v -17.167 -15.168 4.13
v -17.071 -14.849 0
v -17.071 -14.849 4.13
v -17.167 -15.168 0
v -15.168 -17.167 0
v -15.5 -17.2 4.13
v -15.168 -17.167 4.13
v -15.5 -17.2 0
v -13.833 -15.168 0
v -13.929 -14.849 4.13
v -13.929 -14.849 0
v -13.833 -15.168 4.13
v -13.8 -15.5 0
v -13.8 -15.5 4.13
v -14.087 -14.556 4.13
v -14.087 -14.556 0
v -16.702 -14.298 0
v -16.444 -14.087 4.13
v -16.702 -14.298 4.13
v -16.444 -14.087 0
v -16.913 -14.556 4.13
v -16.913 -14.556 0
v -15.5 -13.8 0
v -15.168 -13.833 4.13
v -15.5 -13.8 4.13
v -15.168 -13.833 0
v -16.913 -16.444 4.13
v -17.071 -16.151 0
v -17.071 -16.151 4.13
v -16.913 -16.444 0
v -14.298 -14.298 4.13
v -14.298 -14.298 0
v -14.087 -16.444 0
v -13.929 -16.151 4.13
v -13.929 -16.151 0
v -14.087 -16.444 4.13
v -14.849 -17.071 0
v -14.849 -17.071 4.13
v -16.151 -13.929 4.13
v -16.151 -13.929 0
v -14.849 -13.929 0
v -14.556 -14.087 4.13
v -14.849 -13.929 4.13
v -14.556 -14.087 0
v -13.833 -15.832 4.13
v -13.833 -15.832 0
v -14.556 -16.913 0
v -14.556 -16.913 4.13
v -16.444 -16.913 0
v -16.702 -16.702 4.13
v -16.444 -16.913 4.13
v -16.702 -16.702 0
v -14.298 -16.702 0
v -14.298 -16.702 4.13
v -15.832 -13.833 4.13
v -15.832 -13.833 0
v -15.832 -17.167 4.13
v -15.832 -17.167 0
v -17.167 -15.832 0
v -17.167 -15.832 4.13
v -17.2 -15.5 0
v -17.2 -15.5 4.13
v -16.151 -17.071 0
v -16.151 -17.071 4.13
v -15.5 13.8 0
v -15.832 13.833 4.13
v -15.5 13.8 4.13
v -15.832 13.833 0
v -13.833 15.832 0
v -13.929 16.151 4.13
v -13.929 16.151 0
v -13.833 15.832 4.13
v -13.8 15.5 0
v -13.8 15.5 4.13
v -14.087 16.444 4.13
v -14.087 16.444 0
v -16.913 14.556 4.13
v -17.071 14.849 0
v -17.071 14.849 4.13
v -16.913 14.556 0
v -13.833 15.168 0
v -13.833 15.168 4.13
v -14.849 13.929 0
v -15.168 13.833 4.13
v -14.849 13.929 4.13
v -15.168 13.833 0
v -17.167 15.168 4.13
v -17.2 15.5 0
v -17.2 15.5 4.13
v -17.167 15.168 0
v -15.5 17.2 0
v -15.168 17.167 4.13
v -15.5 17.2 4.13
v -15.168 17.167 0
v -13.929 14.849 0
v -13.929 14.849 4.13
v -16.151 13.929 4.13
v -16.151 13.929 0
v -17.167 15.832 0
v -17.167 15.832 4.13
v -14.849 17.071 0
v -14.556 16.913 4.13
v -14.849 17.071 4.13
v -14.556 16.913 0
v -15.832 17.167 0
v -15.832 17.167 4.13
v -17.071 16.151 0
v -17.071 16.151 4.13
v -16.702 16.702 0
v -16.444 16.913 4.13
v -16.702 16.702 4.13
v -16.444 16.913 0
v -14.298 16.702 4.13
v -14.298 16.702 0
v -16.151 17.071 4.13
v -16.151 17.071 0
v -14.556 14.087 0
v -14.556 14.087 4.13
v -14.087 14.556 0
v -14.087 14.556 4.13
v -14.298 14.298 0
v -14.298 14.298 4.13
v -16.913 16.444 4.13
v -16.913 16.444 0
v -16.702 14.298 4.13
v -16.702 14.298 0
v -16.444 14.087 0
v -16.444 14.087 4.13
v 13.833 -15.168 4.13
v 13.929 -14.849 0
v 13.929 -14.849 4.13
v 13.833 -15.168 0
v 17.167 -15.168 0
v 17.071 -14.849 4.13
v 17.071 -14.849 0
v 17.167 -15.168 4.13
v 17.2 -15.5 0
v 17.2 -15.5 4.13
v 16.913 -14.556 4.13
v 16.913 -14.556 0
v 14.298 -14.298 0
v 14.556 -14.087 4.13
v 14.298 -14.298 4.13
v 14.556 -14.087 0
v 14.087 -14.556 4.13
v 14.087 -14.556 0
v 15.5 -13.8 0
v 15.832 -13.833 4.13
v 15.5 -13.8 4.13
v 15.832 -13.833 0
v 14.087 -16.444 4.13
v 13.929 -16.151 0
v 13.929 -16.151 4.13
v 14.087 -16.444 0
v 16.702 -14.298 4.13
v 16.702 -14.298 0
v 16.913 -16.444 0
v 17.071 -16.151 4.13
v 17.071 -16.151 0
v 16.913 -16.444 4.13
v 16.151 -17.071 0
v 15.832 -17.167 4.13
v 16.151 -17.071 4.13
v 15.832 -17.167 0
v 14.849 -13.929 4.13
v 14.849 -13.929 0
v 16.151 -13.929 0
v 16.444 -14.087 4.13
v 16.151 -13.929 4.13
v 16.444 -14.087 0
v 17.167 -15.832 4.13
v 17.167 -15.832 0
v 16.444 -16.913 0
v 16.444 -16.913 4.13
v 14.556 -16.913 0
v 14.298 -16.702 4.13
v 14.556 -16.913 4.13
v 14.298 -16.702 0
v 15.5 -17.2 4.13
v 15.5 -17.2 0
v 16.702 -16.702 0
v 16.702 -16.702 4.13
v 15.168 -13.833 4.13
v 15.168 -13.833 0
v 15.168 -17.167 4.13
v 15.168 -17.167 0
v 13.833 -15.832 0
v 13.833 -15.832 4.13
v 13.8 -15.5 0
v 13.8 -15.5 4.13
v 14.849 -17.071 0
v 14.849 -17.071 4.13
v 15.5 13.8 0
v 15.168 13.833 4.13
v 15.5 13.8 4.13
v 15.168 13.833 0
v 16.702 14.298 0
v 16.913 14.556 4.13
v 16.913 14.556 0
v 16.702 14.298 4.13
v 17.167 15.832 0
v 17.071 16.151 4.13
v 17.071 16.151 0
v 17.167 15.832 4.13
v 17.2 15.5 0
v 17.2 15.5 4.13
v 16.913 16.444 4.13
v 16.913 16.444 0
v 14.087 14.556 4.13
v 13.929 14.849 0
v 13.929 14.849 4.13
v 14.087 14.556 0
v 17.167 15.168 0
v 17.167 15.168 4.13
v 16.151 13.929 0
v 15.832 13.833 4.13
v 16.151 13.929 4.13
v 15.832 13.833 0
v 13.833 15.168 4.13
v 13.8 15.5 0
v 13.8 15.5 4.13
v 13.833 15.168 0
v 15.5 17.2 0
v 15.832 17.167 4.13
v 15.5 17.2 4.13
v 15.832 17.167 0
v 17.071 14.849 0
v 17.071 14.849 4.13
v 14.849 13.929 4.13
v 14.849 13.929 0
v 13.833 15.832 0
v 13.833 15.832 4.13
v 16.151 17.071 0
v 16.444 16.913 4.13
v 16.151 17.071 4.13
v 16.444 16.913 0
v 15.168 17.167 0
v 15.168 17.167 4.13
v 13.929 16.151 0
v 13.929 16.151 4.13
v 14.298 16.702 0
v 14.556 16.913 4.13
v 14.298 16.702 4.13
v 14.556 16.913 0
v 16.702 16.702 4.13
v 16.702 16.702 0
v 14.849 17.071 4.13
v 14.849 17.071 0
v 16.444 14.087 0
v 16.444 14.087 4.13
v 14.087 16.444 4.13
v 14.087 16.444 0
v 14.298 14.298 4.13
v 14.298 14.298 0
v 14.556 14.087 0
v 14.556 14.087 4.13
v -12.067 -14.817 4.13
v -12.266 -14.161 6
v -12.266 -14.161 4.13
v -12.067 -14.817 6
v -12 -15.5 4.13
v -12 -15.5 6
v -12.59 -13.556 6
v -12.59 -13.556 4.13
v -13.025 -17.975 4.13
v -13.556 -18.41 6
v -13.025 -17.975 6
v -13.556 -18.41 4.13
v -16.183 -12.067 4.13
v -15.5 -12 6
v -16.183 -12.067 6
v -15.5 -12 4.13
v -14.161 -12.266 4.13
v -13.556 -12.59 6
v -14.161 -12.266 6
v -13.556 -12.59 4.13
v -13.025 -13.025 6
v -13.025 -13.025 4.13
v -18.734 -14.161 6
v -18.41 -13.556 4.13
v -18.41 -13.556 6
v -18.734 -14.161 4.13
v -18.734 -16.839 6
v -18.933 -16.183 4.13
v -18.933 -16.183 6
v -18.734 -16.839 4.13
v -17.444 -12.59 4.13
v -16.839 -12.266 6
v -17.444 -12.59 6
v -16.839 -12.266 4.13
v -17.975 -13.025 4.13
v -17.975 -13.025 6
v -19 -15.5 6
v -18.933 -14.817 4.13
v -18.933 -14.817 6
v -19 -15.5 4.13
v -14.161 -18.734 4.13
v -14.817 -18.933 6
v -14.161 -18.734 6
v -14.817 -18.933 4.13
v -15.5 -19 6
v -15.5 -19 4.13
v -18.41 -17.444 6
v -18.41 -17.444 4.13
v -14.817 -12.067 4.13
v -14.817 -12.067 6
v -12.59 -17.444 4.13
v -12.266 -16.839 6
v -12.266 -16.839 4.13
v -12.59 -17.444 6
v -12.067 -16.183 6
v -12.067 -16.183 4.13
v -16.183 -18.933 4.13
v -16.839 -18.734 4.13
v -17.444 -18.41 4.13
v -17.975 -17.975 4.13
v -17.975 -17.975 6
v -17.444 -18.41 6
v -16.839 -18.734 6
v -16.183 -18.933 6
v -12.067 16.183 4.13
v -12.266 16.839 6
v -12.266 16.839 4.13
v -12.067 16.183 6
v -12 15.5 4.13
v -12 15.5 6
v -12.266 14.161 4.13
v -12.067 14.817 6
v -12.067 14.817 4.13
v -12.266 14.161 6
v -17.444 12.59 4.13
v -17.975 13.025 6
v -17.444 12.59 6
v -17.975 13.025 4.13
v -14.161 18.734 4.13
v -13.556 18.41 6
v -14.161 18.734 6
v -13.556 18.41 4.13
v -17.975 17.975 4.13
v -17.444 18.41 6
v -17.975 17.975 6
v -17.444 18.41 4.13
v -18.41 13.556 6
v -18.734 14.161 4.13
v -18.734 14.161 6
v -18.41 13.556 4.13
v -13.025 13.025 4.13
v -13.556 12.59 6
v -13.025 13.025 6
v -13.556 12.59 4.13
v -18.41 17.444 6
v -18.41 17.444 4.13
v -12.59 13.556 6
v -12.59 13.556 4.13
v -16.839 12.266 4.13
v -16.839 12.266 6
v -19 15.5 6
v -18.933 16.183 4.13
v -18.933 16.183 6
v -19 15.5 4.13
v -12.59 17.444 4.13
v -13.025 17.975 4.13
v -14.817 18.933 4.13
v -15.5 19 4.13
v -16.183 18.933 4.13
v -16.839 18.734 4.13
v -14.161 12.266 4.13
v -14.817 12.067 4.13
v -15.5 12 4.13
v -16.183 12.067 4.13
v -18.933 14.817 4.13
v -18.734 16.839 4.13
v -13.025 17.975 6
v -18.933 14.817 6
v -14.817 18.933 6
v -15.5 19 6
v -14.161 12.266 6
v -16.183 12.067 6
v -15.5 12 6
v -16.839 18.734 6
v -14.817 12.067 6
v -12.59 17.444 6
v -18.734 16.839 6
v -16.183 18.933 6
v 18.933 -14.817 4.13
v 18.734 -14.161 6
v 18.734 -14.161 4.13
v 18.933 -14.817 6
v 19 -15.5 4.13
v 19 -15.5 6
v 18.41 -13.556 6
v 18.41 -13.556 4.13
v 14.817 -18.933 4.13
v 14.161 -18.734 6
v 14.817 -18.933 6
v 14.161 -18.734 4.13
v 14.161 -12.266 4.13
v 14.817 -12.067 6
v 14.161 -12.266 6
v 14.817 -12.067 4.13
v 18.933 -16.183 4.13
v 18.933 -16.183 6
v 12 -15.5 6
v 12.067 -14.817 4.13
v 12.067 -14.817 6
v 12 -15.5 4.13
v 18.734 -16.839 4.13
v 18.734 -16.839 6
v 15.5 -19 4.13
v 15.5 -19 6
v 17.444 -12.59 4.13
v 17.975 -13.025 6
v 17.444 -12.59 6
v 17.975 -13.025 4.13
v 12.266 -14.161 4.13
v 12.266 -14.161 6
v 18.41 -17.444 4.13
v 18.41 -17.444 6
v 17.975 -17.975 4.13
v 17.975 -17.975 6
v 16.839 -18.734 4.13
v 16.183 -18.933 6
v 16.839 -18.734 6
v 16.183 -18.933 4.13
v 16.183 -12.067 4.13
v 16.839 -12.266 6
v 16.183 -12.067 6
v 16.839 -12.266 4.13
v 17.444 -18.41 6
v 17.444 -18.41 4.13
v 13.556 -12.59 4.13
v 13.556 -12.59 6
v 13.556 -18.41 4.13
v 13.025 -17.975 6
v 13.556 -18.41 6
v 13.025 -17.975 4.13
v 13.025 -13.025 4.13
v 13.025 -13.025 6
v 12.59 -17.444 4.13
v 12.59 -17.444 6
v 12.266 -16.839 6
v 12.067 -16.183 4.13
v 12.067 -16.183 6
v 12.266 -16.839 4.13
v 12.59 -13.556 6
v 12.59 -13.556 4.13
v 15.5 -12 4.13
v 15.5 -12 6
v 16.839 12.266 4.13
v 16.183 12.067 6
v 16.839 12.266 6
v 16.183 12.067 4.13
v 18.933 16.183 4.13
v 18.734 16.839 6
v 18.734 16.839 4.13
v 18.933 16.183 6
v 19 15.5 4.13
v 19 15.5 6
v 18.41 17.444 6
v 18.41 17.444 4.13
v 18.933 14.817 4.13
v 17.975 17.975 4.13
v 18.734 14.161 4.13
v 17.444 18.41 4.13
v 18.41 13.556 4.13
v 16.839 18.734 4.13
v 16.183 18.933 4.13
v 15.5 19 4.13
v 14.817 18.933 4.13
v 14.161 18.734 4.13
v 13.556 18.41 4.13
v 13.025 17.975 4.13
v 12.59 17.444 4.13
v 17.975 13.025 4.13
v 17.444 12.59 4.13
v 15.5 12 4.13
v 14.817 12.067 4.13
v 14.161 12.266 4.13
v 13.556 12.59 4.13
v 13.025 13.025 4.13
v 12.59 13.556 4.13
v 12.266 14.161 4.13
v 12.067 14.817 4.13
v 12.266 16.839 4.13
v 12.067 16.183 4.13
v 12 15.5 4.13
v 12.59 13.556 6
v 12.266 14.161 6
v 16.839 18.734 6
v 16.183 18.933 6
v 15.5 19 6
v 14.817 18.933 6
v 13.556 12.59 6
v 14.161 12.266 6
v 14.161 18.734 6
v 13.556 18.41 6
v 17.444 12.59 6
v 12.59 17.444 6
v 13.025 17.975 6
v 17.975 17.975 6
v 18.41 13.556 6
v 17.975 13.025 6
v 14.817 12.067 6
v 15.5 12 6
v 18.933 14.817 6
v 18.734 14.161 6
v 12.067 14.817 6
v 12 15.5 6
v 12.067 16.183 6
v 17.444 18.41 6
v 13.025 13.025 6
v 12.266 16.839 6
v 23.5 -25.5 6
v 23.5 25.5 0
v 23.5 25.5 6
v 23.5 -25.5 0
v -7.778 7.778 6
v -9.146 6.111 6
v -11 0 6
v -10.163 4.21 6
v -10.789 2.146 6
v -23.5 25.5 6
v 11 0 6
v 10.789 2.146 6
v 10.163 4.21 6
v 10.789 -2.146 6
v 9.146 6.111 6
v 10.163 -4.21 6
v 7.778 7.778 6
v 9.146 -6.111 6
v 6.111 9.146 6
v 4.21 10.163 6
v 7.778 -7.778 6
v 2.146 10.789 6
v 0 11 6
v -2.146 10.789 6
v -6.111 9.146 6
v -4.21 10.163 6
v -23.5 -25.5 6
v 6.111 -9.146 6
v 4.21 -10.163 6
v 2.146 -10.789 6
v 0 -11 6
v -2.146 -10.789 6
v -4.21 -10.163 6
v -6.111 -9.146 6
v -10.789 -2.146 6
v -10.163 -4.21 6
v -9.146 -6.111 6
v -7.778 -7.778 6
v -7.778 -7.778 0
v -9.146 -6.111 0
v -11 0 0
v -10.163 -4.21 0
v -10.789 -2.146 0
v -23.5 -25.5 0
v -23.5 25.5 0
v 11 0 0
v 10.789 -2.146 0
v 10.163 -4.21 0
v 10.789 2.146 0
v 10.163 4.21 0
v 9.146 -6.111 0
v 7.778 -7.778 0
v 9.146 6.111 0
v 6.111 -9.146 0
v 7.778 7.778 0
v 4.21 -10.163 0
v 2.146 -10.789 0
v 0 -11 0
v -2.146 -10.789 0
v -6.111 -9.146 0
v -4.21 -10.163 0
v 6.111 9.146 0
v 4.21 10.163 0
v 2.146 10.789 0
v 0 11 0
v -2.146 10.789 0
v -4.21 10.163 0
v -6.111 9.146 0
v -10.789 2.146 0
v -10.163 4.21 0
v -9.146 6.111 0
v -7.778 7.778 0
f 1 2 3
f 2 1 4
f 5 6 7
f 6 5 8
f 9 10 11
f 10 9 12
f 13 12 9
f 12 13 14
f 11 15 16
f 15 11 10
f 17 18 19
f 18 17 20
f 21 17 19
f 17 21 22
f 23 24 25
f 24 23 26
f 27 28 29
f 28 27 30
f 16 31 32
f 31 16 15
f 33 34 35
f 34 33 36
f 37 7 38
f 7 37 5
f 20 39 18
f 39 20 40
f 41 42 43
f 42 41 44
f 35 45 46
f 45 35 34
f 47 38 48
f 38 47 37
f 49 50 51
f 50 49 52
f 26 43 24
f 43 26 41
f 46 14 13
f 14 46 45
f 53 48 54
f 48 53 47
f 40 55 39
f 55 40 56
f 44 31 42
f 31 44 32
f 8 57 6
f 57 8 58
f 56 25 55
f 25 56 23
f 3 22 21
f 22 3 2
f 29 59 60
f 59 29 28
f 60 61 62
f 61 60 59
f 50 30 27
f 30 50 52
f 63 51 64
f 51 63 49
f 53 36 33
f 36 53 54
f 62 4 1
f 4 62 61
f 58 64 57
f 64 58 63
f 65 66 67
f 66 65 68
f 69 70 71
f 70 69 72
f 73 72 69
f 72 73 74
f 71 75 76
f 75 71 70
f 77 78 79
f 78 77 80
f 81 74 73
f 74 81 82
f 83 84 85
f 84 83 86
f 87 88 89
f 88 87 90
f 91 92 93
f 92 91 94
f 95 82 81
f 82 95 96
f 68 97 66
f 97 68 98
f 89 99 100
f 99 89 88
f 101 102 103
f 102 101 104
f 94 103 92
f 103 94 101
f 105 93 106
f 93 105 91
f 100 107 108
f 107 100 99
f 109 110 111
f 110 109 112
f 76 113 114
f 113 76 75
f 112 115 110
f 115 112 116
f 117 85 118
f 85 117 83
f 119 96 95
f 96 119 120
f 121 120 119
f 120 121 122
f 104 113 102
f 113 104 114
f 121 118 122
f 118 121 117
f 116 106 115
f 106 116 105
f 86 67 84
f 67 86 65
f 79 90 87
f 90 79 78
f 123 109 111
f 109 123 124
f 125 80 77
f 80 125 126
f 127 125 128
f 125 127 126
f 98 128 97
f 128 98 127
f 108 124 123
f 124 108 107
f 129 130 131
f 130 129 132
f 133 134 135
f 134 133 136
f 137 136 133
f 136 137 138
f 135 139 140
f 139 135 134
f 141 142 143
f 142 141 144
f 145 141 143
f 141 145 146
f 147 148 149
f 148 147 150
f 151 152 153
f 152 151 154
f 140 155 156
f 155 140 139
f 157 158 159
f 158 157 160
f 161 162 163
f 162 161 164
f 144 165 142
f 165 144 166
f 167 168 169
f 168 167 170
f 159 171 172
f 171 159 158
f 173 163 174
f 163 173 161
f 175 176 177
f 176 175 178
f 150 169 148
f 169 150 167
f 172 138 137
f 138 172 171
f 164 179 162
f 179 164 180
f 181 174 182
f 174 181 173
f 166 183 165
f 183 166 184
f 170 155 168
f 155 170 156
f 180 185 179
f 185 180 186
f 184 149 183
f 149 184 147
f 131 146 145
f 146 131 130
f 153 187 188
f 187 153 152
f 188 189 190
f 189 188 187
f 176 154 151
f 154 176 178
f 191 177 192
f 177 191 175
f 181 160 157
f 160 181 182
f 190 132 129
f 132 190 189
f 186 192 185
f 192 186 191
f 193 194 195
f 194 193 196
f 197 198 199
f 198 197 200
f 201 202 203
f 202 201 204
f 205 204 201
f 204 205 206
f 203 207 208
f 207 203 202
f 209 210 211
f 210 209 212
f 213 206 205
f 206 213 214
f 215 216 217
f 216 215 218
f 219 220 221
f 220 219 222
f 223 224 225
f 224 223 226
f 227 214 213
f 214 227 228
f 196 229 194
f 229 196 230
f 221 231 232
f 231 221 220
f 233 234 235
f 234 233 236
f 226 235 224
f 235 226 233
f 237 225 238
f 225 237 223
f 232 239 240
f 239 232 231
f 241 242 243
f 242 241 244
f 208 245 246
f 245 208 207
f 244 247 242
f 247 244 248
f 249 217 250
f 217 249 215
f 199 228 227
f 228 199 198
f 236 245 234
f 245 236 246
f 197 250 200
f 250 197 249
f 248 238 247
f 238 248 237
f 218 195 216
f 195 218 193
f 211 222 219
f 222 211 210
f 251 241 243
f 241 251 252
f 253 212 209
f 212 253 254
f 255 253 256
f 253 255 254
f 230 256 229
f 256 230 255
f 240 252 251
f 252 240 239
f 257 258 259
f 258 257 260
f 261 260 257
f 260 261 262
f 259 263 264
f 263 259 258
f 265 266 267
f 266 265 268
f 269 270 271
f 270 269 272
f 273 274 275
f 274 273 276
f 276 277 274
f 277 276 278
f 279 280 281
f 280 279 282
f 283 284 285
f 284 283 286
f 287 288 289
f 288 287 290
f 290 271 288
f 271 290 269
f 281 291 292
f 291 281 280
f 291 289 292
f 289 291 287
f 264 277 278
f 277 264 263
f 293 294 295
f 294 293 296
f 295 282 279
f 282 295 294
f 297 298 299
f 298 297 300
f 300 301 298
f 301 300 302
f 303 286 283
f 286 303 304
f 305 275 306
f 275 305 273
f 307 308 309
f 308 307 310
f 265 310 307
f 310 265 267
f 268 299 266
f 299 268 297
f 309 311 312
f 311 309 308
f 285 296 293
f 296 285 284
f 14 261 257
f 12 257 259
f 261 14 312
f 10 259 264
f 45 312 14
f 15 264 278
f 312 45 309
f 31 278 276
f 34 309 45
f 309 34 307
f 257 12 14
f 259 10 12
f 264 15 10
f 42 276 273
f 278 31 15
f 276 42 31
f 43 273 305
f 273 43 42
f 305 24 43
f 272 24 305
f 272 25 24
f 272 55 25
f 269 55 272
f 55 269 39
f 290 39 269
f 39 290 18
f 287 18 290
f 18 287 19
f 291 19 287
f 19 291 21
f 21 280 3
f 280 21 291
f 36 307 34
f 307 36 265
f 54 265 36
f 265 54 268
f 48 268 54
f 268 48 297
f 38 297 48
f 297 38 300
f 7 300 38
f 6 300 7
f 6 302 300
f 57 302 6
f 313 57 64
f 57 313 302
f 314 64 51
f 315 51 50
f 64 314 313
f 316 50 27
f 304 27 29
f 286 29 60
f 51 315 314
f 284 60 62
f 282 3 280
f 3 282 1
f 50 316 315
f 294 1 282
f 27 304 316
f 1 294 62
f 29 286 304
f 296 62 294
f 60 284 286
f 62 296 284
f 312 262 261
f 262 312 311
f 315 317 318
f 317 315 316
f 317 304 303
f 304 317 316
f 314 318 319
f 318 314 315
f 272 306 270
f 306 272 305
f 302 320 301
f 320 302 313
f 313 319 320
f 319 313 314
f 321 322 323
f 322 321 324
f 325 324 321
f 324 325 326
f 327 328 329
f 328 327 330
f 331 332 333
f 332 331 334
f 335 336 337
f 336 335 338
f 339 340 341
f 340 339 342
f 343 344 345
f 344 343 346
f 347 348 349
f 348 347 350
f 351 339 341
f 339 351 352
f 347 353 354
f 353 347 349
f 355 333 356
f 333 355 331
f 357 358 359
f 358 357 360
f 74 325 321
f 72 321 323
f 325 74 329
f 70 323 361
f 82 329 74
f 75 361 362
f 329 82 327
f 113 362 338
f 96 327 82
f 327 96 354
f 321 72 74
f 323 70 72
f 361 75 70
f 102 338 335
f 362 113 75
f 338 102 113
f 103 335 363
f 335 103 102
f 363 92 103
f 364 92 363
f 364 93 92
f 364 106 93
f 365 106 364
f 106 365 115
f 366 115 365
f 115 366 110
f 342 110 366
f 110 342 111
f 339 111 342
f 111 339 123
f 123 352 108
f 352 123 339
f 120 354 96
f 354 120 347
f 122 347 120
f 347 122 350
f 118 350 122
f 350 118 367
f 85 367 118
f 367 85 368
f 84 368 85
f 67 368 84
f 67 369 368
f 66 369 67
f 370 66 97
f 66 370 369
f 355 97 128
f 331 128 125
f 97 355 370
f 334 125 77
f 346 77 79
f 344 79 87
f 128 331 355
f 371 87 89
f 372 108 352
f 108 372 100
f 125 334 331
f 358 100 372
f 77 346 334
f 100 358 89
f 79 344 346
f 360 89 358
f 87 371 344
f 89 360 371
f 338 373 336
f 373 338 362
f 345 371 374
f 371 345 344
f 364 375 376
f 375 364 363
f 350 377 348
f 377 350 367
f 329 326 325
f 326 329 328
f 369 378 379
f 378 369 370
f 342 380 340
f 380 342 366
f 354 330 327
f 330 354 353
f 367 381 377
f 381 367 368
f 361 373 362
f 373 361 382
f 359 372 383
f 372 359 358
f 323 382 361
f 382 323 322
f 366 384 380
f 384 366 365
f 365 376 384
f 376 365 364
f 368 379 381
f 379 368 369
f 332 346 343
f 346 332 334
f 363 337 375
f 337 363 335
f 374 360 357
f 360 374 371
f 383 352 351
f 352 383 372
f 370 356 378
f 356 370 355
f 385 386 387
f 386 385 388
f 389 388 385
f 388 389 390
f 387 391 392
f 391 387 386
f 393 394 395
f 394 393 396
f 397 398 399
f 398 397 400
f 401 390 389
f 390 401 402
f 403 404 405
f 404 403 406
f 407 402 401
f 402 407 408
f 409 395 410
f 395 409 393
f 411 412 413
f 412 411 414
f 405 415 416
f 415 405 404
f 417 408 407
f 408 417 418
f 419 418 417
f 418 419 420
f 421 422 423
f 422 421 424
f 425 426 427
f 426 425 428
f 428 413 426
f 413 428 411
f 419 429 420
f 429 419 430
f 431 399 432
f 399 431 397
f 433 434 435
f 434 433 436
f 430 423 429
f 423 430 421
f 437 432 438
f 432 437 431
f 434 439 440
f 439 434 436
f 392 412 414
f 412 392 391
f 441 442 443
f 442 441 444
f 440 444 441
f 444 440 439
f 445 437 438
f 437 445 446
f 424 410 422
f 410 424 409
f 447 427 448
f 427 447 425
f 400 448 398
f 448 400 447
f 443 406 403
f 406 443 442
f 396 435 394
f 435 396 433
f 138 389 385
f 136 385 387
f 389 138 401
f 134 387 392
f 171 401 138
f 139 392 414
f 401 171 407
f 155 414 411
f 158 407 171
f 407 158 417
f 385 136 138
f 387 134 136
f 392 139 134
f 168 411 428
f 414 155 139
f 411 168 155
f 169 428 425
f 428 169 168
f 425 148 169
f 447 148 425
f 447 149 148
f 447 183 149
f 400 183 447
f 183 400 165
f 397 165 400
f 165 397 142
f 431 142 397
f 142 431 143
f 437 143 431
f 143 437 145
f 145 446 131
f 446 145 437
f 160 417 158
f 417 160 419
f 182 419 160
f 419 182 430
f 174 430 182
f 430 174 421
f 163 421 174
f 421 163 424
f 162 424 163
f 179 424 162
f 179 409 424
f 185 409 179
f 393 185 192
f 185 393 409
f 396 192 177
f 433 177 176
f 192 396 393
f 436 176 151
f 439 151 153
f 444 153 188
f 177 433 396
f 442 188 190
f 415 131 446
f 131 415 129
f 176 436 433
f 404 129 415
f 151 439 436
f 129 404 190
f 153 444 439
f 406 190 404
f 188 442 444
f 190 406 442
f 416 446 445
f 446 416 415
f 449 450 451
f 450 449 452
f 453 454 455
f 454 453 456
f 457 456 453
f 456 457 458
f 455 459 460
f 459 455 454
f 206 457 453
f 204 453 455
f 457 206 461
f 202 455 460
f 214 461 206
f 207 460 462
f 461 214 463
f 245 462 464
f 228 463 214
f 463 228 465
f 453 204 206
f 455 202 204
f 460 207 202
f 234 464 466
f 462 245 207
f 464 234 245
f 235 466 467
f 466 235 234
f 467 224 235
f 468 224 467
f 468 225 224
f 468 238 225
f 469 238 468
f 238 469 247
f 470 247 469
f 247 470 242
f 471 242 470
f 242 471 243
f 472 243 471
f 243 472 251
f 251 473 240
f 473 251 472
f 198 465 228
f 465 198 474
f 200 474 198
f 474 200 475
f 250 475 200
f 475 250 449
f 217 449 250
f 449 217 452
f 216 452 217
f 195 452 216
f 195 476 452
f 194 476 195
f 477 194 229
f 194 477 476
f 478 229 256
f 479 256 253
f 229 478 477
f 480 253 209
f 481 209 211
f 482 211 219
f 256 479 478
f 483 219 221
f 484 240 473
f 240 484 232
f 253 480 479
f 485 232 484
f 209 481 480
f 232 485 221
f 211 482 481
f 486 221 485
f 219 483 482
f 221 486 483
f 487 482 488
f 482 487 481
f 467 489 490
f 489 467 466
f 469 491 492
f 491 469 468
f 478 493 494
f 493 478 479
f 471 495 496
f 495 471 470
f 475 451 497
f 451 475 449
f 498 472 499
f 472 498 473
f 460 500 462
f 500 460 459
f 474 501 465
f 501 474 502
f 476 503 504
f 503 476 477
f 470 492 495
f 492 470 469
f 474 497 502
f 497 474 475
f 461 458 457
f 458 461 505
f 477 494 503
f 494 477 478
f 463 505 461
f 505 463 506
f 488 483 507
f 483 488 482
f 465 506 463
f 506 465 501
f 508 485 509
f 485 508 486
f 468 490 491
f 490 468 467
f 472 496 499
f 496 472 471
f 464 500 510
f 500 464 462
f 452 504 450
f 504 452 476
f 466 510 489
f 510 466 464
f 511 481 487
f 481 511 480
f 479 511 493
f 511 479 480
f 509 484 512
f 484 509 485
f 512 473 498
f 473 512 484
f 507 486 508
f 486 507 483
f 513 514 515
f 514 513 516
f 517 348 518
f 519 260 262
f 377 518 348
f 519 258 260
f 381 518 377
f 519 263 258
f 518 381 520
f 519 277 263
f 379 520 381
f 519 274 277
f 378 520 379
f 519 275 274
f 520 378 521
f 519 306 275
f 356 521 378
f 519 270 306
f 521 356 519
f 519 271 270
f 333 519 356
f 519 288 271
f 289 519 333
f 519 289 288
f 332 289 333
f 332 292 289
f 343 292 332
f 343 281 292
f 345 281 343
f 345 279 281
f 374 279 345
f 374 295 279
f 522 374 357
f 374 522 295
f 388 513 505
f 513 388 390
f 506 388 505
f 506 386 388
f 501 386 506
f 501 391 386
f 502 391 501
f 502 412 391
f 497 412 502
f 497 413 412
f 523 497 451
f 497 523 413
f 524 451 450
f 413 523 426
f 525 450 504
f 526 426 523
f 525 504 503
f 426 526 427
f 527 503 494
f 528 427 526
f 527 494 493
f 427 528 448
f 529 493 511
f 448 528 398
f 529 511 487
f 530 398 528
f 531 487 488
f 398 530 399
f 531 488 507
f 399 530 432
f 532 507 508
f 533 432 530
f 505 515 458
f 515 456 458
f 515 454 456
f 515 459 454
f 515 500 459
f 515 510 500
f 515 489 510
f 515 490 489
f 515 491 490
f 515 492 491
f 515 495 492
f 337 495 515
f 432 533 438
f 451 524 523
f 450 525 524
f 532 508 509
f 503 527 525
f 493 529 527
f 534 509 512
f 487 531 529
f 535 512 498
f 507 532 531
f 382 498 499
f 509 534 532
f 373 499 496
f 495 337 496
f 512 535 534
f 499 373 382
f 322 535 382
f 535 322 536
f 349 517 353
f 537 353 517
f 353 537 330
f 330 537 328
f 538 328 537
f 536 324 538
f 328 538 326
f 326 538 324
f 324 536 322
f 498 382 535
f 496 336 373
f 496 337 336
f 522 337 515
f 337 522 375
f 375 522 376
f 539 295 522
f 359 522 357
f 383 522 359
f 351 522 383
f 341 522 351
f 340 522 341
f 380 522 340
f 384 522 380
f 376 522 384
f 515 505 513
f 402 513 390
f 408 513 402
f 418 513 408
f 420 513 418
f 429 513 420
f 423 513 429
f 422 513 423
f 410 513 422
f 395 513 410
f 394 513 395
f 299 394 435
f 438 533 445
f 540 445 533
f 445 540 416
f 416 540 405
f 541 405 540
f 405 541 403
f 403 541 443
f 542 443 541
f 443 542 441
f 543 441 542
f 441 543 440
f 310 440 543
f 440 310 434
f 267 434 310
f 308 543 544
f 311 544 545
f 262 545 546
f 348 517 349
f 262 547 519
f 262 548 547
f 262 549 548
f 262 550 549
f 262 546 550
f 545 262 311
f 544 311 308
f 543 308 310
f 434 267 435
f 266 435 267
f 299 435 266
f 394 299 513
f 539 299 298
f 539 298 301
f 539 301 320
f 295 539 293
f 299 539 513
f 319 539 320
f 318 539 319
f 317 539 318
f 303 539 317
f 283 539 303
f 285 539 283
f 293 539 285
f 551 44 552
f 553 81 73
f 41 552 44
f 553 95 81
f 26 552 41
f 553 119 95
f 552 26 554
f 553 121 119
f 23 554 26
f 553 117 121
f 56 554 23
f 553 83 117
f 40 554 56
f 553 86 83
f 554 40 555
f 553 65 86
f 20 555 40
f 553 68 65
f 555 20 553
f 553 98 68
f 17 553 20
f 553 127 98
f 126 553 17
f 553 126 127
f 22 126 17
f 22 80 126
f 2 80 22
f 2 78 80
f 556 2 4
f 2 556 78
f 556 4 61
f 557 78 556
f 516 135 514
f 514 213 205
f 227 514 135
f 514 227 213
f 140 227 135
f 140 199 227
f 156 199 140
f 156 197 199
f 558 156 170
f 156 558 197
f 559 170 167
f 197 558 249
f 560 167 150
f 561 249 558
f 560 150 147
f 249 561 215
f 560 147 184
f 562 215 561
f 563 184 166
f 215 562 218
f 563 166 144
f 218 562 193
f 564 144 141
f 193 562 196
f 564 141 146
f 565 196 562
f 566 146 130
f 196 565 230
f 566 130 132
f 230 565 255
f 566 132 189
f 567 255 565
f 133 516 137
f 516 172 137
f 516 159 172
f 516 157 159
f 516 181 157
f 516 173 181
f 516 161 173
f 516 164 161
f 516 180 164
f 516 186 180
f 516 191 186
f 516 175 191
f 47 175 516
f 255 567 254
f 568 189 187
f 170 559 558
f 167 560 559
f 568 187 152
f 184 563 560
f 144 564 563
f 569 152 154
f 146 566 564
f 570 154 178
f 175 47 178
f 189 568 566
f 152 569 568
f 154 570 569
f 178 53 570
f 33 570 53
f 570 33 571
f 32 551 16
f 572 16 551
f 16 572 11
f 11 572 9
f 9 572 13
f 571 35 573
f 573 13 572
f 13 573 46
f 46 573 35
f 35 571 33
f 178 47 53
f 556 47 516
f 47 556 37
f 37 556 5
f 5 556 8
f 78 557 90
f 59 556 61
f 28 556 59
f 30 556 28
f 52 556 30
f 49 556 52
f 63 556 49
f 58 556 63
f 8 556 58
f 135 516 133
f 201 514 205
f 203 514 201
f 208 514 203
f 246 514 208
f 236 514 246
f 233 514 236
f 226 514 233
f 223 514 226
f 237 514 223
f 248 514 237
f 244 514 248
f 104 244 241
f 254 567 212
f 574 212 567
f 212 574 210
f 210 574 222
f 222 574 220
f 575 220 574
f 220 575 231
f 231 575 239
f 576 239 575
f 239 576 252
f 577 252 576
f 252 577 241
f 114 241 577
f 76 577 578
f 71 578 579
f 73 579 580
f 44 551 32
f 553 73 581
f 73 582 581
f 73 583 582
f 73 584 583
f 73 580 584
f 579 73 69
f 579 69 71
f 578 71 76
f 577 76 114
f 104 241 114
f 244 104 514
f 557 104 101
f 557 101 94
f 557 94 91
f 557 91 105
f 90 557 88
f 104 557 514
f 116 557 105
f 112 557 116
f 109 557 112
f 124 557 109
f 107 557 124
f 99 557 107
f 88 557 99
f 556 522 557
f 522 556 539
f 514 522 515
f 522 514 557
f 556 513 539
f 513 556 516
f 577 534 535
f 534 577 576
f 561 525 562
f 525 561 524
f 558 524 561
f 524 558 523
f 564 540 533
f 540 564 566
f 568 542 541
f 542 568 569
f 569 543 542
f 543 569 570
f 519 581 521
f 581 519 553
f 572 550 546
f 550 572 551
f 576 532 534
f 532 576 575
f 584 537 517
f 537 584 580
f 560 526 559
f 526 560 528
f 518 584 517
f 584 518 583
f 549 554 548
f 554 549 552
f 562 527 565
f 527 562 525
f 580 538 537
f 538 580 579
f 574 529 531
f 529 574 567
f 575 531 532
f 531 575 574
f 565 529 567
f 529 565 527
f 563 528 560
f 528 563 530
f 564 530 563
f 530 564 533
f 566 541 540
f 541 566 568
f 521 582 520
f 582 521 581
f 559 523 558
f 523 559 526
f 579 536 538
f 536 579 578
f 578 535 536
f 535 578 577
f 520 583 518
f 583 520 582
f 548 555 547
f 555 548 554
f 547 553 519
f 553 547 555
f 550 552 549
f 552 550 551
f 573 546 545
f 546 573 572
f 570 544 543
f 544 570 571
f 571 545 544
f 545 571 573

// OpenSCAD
$fn = 32;

// ----------------------------------------------------------------------
// Motor mount plate: NEMA17, 47 x 51 x 6 mm
// ----------------------------------------------------------------------

// --- parameters (mm) ---
base_x = 47;              // plate length, X
base_y = 51;              // plate width, Y
thick = 6;                // plate thickness
bolt_pitch = 31;          // NEMA17 bolt spacing
motor_d = 3.4;            // NEMA17 screw clearance
boss_hole = 22;           // pilot boss bore
cb_d = 7;                 // counterbore seat
cb_h = 1.87;              // counterbore depth

module plate() {
  translate([-base_x / 2, -base_y / 2, 0]) cube([base_x, base_y, thick]);
}

module motor_holes() {
  for (sx = [-1, 1]) for (sy = [-1, 1])
    translate([sx * bolt_pitch / 2, sy * bolt_pitch / 2, -1])
      cylinder(h = thick + 2, d = motor_d);
}
module motor_counterbores() {
  for (sx = [-1, 1]) for (sy = [-1, 1])
    translate([sx * bolt_pitch / 2, sy * bolt_pitch / 2, thick - cb_h])
      cylinder(h = cb_h + 0.6, d = cb_d);
}

difference() {
  union() {
    plate();
  }
  motor_holes();
  translate([0, 0, -1]) cylinder(h = thick + 2, d = boss_hole);
  motor_counterbores();
}
